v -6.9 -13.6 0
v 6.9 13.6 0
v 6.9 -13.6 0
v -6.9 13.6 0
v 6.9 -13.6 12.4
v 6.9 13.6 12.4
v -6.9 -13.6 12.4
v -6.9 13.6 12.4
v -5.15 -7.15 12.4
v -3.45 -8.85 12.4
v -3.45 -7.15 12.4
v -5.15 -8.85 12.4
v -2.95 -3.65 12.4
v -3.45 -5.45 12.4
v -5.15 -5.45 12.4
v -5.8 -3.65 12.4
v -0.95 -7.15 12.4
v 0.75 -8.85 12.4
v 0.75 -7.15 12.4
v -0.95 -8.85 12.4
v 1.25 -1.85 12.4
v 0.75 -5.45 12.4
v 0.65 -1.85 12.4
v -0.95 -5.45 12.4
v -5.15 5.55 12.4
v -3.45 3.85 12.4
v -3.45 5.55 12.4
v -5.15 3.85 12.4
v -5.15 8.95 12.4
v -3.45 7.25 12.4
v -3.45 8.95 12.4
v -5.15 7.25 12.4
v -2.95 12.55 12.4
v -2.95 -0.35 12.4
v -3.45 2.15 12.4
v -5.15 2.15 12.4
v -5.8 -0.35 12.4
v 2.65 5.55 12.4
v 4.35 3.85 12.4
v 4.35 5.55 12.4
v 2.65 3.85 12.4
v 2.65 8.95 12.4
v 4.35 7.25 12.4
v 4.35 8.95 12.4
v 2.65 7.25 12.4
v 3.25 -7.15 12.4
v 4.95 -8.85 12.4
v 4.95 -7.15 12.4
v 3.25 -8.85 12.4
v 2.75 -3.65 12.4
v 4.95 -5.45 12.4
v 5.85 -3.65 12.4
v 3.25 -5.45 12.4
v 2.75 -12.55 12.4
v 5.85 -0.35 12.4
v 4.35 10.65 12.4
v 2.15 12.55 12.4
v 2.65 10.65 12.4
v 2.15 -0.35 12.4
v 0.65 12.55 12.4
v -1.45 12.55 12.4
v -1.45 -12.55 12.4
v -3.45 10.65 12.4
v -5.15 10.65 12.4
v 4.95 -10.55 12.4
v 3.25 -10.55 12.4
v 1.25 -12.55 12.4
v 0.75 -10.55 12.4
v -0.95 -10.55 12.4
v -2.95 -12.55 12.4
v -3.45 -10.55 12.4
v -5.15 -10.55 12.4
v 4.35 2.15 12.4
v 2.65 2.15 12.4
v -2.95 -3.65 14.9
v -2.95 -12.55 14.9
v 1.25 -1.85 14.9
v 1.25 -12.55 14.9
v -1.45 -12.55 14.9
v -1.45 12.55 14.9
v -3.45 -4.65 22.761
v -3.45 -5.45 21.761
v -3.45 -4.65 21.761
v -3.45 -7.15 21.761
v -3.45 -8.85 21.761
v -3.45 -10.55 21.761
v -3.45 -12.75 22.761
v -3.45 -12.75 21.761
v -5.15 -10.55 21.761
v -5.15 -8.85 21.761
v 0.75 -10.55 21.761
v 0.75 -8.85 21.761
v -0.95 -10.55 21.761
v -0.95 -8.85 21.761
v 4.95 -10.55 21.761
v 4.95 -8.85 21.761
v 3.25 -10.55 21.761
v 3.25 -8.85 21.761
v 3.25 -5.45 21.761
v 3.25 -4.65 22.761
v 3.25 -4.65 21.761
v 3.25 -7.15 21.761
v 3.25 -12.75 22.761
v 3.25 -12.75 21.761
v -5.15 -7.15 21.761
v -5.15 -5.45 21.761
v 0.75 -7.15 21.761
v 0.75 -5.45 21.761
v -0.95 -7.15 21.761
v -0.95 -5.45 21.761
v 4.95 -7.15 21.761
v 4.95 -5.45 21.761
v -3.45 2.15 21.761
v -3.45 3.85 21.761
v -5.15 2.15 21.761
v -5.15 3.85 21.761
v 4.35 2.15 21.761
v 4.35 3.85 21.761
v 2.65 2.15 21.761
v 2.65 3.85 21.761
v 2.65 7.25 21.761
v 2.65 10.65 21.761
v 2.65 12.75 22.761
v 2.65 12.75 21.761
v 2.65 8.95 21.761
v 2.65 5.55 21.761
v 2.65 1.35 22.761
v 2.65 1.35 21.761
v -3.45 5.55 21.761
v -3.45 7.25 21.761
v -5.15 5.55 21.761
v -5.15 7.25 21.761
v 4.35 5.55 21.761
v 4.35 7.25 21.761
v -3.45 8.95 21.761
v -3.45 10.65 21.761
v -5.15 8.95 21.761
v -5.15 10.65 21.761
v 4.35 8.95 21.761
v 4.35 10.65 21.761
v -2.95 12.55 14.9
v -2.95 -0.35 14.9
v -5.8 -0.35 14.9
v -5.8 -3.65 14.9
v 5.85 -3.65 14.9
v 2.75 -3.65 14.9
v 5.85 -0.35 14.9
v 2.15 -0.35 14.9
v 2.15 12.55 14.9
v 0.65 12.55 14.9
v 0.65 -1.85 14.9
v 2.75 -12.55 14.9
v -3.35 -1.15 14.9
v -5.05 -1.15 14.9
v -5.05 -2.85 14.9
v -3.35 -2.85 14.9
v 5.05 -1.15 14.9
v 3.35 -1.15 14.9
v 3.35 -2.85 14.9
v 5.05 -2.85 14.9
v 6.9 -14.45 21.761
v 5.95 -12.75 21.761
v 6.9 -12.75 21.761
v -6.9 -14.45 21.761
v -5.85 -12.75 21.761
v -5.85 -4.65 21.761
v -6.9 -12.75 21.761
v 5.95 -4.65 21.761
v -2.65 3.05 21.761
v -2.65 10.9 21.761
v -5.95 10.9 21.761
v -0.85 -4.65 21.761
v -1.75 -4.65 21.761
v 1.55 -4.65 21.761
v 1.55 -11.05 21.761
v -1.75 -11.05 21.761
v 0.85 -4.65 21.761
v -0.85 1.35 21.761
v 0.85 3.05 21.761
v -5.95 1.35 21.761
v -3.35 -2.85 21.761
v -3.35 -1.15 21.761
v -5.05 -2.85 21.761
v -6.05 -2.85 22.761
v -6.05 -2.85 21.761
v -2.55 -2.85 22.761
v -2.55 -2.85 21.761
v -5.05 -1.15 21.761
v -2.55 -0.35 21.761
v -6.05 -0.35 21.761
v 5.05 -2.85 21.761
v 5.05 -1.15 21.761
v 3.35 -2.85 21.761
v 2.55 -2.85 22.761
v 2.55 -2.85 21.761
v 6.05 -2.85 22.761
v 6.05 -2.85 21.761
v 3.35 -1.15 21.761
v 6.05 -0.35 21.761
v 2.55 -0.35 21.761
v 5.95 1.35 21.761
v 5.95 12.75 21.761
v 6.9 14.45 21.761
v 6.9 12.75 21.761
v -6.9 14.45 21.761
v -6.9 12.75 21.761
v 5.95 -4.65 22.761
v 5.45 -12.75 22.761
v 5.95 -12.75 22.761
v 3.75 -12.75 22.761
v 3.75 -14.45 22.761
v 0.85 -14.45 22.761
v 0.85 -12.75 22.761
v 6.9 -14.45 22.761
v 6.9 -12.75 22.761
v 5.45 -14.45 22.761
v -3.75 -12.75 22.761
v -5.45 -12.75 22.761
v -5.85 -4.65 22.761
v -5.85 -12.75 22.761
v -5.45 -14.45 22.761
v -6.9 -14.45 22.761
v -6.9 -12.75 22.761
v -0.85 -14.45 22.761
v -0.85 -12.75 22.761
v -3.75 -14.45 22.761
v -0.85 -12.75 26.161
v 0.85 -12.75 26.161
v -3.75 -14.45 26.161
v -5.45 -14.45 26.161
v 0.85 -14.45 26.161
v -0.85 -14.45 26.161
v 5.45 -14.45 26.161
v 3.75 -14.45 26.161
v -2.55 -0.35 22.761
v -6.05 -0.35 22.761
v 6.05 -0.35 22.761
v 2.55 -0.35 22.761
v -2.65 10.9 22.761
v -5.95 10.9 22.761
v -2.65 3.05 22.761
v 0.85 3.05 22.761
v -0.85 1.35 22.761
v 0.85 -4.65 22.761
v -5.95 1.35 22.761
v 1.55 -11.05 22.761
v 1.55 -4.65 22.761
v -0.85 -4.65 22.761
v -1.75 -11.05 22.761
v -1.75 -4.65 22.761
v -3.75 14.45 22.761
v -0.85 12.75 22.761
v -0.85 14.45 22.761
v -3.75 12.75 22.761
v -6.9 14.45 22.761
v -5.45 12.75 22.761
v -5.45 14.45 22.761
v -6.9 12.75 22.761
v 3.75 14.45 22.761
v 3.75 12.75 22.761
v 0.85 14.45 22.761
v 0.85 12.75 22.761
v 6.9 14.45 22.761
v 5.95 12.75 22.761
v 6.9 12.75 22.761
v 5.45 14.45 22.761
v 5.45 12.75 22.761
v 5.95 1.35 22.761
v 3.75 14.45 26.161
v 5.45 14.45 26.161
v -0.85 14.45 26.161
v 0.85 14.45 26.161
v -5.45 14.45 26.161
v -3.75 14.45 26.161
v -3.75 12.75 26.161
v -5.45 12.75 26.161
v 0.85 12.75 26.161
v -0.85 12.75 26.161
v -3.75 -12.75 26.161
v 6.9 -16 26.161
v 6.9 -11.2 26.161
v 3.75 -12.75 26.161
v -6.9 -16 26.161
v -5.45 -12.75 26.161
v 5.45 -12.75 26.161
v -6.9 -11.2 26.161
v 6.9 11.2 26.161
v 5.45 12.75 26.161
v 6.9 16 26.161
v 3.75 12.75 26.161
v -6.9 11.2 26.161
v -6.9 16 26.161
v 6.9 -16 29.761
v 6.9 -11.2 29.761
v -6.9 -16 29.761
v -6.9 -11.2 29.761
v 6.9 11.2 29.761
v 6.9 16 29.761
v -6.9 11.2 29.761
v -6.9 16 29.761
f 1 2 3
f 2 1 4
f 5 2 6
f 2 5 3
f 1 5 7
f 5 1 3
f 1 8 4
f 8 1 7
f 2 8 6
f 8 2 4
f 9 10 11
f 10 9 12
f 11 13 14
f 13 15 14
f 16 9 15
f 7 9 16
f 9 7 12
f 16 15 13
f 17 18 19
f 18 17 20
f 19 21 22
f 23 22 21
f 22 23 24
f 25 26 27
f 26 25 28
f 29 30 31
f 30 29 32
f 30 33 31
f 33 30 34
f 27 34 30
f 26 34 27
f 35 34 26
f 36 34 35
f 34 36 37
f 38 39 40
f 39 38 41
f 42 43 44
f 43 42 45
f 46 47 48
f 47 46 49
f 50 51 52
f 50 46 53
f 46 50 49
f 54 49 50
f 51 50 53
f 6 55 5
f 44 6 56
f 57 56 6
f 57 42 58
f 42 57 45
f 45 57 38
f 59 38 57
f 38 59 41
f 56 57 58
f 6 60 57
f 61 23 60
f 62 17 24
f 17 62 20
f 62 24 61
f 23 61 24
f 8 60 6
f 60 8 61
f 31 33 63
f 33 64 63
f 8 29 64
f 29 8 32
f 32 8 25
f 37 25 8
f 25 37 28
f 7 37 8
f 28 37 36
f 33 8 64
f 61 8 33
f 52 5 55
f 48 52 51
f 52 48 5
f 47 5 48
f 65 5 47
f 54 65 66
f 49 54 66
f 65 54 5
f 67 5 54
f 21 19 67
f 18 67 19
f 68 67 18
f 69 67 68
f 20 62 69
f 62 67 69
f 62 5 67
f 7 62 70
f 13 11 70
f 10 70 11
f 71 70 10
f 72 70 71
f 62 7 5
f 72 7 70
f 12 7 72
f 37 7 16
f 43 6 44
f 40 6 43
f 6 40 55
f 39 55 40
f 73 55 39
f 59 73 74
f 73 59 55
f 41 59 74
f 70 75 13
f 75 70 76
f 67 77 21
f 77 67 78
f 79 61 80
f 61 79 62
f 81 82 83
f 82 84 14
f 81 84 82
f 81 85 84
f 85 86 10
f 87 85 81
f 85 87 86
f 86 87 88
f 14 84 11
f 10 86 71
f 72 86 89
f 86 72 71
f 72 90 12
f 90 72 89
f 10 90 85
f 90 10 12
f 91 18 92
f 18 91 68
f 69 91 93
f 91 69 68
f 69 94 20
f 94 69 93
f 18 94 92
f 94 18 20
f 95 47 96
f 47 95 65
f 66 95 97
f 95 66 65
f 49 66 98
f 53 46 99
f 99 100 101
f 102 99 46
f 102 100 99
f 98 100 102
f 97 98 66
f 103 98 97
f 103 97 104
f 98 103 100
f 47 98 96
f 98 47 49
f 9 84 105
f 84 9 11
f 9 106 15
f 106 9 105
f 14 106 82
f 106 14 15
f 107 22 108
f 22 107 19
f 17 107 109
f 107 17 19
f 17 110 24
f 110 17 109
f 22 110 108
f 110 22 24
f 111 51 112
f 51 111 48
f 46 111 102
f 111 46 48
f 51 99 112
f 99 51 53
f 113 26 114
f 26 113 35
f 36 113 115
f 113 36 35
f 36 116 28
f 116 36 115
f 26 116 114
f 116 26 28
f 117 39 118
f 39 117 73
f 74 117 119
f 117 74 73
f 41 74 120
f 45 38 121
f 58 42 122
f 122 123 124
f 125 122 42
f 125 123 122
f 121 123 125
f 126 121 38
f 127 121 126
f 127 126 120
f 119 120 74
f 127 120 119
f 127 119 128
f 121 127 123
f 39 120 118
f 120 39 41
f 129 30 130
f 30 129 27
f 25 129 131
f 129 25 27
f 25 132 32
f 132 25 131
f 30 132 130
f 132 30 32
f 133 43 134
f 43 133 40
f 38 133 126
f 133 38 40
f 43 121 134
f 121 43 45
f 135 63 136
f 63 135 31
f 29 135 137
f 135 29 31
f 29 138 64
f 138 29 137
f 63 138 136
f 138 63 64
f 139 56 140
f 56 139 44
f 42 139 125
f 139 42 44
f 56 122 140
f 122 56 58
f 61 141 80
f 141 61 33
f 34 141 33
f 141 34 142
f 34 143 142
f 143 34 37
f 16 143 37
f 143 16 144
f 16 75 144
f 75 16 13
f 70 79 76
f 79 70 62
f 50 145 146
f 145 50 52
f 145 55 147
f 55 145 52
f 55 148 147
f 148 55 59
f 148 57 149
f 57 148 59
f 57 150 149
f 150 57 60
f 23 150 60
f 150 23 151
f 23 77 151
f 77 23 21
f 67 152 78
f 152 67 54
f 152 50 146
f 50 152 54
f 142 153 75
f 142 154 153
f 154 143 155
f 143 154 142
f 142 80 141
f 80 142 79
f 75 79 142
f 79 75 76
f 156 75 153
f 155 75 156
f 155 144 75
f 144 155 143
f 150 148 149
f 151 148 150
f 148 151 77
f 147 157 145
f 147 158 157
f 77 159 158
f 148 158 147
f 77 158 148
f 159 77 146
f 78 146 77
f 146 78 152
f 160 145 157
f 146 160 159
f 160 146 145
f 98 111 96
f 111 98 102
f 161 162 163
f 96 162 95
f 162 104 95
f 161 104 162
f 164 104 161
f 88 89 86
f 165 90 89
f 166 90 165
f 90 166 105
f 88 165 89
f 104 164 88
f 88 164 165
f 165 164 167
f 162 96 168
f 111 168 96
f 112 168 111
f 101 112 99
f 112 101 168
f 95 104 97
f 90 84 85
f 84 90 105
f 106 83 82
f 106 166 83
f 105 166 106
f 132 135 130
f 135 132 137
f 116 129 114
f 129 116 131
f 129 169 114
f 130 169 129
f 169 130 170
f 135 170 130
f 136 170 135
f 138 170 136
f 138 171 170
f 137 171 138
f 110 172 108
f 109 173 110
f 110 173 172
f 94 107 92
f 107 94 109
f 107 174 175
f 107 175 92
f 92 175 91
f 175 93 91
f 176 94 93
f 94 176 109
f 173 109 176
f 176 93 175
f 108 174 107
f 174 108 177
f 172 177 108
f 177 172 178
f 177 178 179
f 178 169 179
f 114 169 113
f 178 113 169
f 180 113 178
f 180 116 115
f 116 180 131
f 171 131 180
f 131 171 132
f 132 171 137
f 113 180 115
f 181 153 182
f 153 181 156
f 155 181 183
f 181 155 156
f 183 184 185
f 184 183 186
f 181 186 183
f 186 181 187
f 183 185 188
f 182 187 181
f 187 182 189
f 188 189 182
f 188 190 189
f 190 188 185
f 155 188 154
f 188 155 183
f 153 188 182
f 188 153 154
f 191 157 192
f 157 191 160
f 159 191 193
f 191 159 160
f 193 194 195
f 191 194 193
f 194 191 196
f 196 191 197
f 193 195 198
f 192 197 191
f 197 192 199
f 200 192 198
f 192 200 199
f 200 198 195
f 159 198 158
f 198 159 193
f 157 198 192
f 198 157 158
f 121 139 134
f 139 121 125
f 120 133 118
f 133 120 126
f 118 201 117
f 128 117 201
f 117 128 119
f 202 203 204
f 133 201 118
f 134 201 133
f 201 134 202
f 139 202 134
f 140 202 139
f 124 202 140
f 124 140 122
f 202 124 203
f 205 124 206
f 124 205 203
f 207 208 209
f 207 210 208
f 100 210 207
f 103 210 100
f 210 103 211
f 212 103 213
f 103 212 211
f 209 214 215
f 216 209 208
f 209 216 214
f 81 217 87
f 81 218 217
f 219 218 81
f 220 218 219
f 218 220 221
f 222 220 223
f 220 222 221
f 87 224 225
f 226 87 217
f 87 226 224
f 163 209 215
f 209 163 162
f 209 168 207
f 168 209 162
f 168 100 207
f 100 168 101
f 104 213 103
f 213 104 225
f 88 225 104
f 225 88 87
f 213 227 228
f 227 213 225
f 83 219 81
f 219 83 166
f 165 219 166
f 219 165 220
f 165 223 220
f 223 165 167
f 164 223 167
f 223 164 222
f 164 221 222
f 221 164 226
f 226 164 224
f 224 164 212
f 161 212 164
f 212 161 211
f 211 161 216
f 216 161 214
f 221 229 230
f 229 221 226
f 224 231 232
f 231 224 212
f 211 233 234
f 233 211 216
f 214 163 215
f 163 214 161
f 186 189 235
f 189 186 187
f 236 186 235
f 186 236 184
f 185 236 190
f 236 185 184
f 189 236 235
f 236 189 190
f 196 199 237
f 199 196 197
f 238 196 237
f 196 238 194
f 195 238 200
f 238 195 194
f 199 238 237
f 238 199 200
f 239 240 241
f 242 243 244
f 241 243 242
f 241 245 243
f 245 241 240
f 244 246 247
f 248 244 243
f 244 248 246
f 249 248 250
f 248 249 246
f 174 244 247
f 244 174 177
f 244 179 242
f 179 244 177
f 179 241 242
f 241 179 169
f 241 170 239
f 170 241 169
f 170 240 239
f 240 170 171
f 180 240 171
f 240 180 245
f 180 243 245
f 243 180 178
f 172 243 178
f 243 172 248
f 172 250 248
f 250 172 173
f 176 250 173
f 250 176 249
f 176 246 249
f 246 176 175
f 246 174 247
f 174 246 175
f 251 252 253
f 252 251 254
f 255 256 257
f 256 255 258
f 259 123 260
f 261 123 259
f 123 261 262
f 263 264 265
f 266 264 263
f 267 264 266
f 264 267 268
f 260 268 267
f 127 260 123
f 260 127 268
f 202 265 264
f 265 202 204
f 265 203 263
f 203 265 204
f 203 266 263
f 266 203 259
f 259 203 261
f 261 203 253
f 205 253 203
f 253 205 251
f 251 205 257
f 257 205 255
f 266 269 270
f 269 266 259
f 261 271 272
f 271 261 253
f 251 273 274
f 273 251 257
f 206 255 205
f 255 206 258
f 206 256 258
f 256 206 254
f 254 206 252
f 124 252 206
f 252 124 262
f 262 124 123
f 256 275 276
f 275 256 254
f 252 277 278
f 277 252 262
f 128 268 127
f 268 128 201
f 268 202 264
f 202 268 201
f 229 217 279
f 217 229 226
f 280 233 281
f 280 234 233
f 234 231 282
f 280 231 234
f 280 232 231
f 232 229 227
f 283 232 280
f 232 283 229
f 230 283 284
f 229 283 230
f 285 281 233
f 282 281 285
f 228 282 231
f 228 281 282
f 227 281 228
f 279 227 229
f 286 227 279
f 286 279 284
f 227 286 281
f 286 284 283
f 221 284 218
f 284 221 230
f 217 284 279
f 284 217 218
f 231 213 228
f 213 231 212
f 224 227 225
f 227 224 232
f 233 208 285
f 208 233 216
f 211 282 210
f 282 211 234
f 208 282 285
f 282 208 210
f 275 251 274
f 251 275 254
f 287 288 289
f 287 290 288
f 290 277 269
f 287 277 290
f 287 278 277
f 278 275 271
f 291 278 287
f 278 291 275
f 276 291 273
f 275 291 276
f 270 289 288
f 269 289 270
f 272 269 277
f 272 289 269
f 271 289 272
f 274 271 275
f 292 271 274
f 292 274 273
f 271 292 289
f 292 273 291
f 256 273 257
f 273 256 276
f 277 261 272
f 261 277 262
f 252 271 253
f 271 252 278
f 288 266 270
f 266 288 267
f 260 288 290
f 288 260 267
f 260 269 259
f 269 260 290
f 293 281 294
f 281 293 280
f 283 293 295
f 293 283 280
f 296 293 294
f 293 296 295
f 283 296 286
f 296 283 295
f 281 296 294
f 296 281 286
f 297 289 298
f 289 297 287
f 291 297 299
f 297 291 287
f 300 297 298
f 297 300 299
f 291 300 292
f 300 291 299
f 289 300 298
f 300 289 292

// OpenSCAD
// Generated by SolidPython 0.4.2 on 2020-09-29 23:21:31
//!OpenSCAD

scale(v = 0.0100000000) {
	translate(v = [-690, -1360, 0]) {
		union() {
			color(c = [0.4000000000, 0.4000000000, 0.4000000000]) {
				translate(v = [0, 0, 0]) {
					linear_extrude(height = 1000.0000000000) {
						polygon(paths = [[0, 1, 2, 3]], points = [[0, 0], [0, 2720], [1380, 2720], [1380, 0]]);
					}
				}
			}
			color(c = [0.2000000000, 0.6000000000, 0.2000000000]) {
				translate(v = [0, 0, 1000.0000000000]) {
					linear_extrude(height = 120.0000000000) {
						polygon(paths = [[0, 1, 2, 3]], points = [[0, 1305], [0, 2720], [1380, 2720], [1380, 1305]]);
					}
				}
			}
			color(c = [0.4000000000, 0.4000000000, 0.4000000000]) {
				translate(v = [0, 0, 1000.0000000000]) {
					linear_extrude(height = 120.0000000000) {
						polygon(paths = [[0, 1, 2, 3]], points = [[0, 0], [0, 1305], [1380, 1305], [1380, 0]]);
					}
				}
			}
			color(c = [0.9000000000, 0.6000000000, 0.6000000000]) {
				translate(v = [0, 0, 1120.0000000000]) {
					linear_extrude(height = 120.0000000000) {
						polygon(paths = [[0, 1, 2, 3]], points = [[135, 1485], [135, 2485], [395, 2485], [395, 1485]]);
					}
				}
			}
			color(c = [0.9000000000, 0.6000000000, 0.6000000000]) {
				translate(v = [0, 0, 1120.0000000000]) {
					linear_extrude(height = 120.0000000000) {
						polygon(paths = [[0, 1, 2, 3]], points = [[545, 1485], [545, 2485], [755, 2485], [755, 1485]]);
					}
				}
			}
			color(c = [0.9000000000, 0.6000000000, 0.6000000000]) {
				translate(v = [0, 0, 1120.0000000000]) {
					linear_extrude(height = 120.0000000000) {
						polygon(paths = [[0, 1, 2, 3]], points = [[905, 1485], [905, 2485], [1165, 2485], [1165, 1485]]);
					}
				}
			}
			color(c = [0.9000000000, 0.6000000000, 0.9000000000]) {
				translate(v = [0, 0, 1120.0000000000]) {
					linear_extrude(height = 120.0000000000) {
						polygon(paths = [[0, 1, 2, 3]], points = [[135, 235], [135, 885], [395, 885], [395, 235]]);
					}
				}
			}
			color(c = [0.9000000000, 0.6000000000, 0.9000000000]) {
				translate(v = [0, 0, 1120.0000000000]) {
					linear_extrude(height = 120.0000000000) {
						polygon(paths = [[0, 1, 2, 3]], points = [[545, 235], [545, 885], [815, 885], [815, 235]]);
					}
				}
			}
			color(c = [0.9000000000, 0.6000000000, 0.9000000000]) {
				translate(v = [0, 0, 1120.0000000000]) {
					linear_extrude(height = 120.0000000000) {
						polygon(paths = [[0, 1, 2, 3]], points = [[965, 235], [965, 885], [1225, 885], [1225, 235]]);
					}
				}
			}
			color(c = [0.2000000000, 0.6000000000, 0.2000000000]) {
				translate(v = [0, 0, 1120.0000000000]) {
					linear_extrude(height = 120.0000000000) {
						difference() {
							polygon(paths = [[0, 1, 2, 3]], points = [[0, 1305], [0, 2720], [1380, 2720], [1380, 1305]]);
							polygon(paths = [[0, 1, 2, 3]], points = [[135, 1485], [395, 1485], [395, 2485], [135, 2485]]);
							polygon(paths = [[0, 1, 2, 3]], points = [[545, 1485], [755, 1485], [755, 2485], [545, 2485]]);
							polygon(paths = [[0, 1, 2, 3]], points = [[905, 1485], [1165, 1485], [1165, 2485], [905, 2485]]);
						}
					}
				}
			}
			color(c = [0.4000000000, 0.4000000000, 0.4000000000]) {
				translate(v = [0, 0, 1120.0000000000]) {
					linear_extrude(height = 120.0000000000) {
						difference() {
							polygon(paths = [[0, 1, 2, 3]], points = [[0, 0], [0, 1305], [1380, 1305], [1380, 0]]);
							polygon(paths = [[0, 1, 2, 3]], points = [[135, 235], [395, 235], [395, 885], [135, 885]]);
							polygon(paths = [[0, 1, 2, 3]], points = [[545, 235], [815, 235], [815, 885], [545, 885]]);
							polygon(paths = [[0, 1, 2, 3]], points = [[965, 235], [1225, 235], [1225, 885], [965, 885]]);
						}
					}
				}
			}
			color(c = [0.1000000000, 0.1000000000, 0.1000000000]) {
				translate(v = [0, 0, 1240.0000000000]) {
					linear_extrude(height = 70.0000000000) {
						polygon(paths = [[0, 1, 2, 3]], points = [[175, 305], [175, 475], [345, 475], [345, 305]]);
					}
				}
			}
			color(c = [0.1000000000, 0.1000000000, 0.1000000000]) {
				translate(v = [0, 0, 1240.0000000000]) {
					linear_extrude(height = 70.0000000000) {
						polygon(paths = [[0, 1, 2, 3]], points = [[595, 305], [595, 475], [765, 475], [765, 305]]);
					}
				}
			}
			color(c = [0.1000000000, 0.1000000000, 0.1000000000]) {
				translate(v = [0, 0, 1240.0000000000]) {
					linear_extrude(height = 70.0000000000) {
						polygon(paths = [[0, 1, 2, 3]], points = [[1015, 305], [1015, 475], [1185, 475], [1185, 305]]);
					}
				}
			}
			color(c = [0.1000000000, 0.1000000000, 0.1000000000]) {
				translate(v = [0, 0, 1240.0000000000]) {
					linear_extrude(height = 70.0000000000) {
						polygon(paths = [[0, 1, 2, 3]], points = [[175, 645], [175, 815], [345, 815], [345, 645]]);
					}
				}
			}
			color(c = [0.1000000000, 0.1000000000, 0.1000000000]) {
				translate(v = [0, 0, 1240.0000000000]) {
					linear_extrude(height = 70.0000000000) {
						polygon(paths = [[0, 1, 2, 3]], points = [[595, 645], [595, 815], [765, 815], [765, 645]]);
					}
				}
			}
			color(c = [0.1000000000, 0.1000000000, 0.1000000000]) {
				translate(v = [0, 0, 1240.0000000000]) {
					linear_extrude(height = 70.0000000000) {
						polygon(paths = [[0, 1, 2, 3]], points = [[1015, 645], [1015, 815], [1185, 815], [1185, 645]]);
					}
				}
			}
			color(c = [0.1000000000, 0.1000000000, 0.1000000000]) {
				translate(v = [0, 0, 1240.0000000000]) {
					linear_extrude(height = 70.0000000000) {
						polygon(paths = [[0, 1, 2, 3]], points = [[175, 1575], [175, 1745], [345, 1745], [345, 1575]]);
					}
				}
			}
			color(c = [0.1000000000, 0.1000000000, 0.1000000000]) {
				translate(v = [0, 0, 1240.0000000000]) {
					linear_extrude(height = 70.0000000000) {
						polygon(paths = [[0, 1, 2, 3]], points = [[955, 1575], [955, 1745], [1125, 1745], [1125, 1575]]);
					}
				}
			}
			color(c = [0.1000000000, 0.1000000000, 0.1000000000]) {
				translate(v = [0, 0, 1240.0000000000]) {
					linear_extrude(height = 70.0000000000) {
						polygon(paths = [[0, 1, 2, 3]], points = [[175, 1915], [175, 2085], [345, 2085], [345, 1915]]);
					}
				}
			}
			color(c = [0.1000000000, 0.1000000000, 0.1000000000]) {
				translate(v = [0, 0, 1240.0000000000]) {
					linear_extrude(height = 70.0000000000) {
						polygon(paths = [[0, 1, 2, 3]], points = [[955, 1915], [955, 2085], [1125, 2085], [1125, 1915]]);
					}
				}
			}
			color(c = [0.1000000000, 0.1000000000, 0.1000000000]) {
				translate(v = [0, 0, 1240.0000000000]) {
					linear_extrude(height = 70.0000000000) {
						polygon(paths = [[0, 1, 2, 3]], points = [[175, 2255], [175, 2425], [345, 2425], [345, 2255]]);
					}
				}
			}
			color(c = [0.1000000000, 0.1000000000, 0.1000000000]) {
				translate(v = [0, 0, 1240.0000000000]) {
					linear_extrude(height = 70.0000000000) {
						polygon(paths = [[0, 1, 2, 3]], points = [[955, 2255], [955, 2425], [1125, 2425], [1125, 2255]]);
					}
				}
			}
			color(c = [1.0000000000, 1.0000000000, 1.0000000000]) {
				translate(v = [0, 0, 1240.0000000000]) {
					linear_extrude(height = 70.0000000000) {
						polygon(paths = [[0, 1, 2, 3, 4, 5, 6, 7]], points = [[395, 105], [395, 995], [110, 995], [110, 1325], [395, 1325], [395, 2615], [545, 2615], [545, 105]]);
					}
				}
			}
			color(c = [1.0000000000, 1.0000000000, 1.0000000000]) {
				translate(v = [0, 0, 1240.0000000000]) {
					linear_extrude(height = 70.0000000000) {
						polygon(paths = [[0, 1, 2, 3, 4, 5, 6, 7, 8, 9]], points = [[815, 105], [815, 1175], [755, 1175], [755, 2615], [905, 2615], [905, 1325], [1275, 1325], [1275, 995], [965, 995], [965, 105]]);
					}
				}
			}
			color(c = [0.1000000000, 0.1000000000, 0.1000000000]) {
				translate(v = [0, 0, 1310.0000000000]) {
					linear_extrude(height = 180.0000000000) {
						polygon(paths = [[0, 1, 2, 3]], points = [[175, 305], [175, 475], [345, 475], [345, 305]]);
					}
				}
			}
			color(c = [0.1000000000, 0.1000000000, 0.1000000000]) {
				translate(v = [0, 0, 1310.0000000000]) {
					linear_extrude(height = 180.0000000000) {
						polygon(paths = [[0, 1, 2, 3]], points = [[595, 305], [595, 475], [765, 475], [765, 305]]);
					}
				}
			}
			color(c = [0.1000000000, 0.1000000000, 0.1000000000]) {
				translate(v = [0, 0, 1310.0000000000]) {
					linear_extrude(height = 180.0000000000) {
						polygon(paths = [[0, 1, 2, 3]], points = [[1015, 305], [1015, 475], [1185, 475], [1185, 305]]);
					}
				}
			}
			color(c = [0.1000000000, 0.1000000000, 0.1000000000]) {
				translate(v = [0, 0, 1310.0000000000]) {
					linear_extrude(height = 180.0000000000) {
						polygon(paths = [[0, 1, 2, 3]], points = [[175, 645], [175, 815], [345, 815], [345, 645]]);
					}
				}
			}
			color(c = [0.1000000000, 0.1000000000, 0.1000000000]) {
				translate(v = [0, 0, 1310.0000000000]) {
					linear_extrude(height = 180.0000000000) {
						polygon(paths = [[0, 1, 2, 3]], points = [[595, 645], [595, 815], [765, 815], [765, 645]]);
					}
				}
			}
			color(c = [0.1000000000, 0.1000000000, 0.1000000000]) {
				translate(v = [0, 0, 1310.0000000000]) {
					linear_extrude(height = 180.0000000000) {
						polygon(paths = [[0, 1, 2, 3]], points = [[1015, 645], [1015, 815], [1185, 815], [1185, 645]]);
					}
				}
			}
			color(c = [0.1000000000, 0.1000000000, 0.1000000000]) {
				translate(v = [0, 0, 1310.0000000000]) {
					linear_extrude(height = 180.0000000000) {
						polygon(paths = [[0, 1, 2, 3]], points = [[175, 1575], [175, 1745], [345, 1745], [345, 1575]]);
					}
				}
			}
			color(c = [0.1000000000, 0.1000000000, 0.1000000000]) {
				translate(v = [0, 0, 1310.0000000000]) {
					linear_extrude(height = 180.0000000000) {
						polygon(paths = [[0, 1, 2, 3]], points = [[955, 1575], [955, 1745], [1125, 1745], [1125, 1575]]);
					}
				}
			}
			color(c = [0.1000000000, 0.1000000000, 0.1000000000]) {
				translate(v = [0, 0, 1310.0000000000]) {
					linear_extrude(height = 180.0000000000) {
						polygon(paths = [[0, 1, 2, 3]], points = [[175, 1915], [175, 2085], [345, 2085], [345, 1915]]);
					}
				}
			}
			color(c = [0.1000000000, 0.1000000000, 0.1000000000]) {
				translate(v = [0, 0, 1310.0000000000]) {
					linear_extrude(height = 180.0000000000) {
						polygon(paths = [[0, 1, 2, 3]], points = [[955, 1915], [955, 2085], [1125, 2085], [1125, 1915]]);
					}
				}
			}
			color(c = [0.1000000000, 0.1000000000, 0.1000000000]) {
				translate(v = [0, 0, 1310.0000000000]) {
					linear_extrude(height = 180.0000000000) {
						polygon(paths = [[0, 1, 2, 3]], points = [[175, 2255], [175, 2425], [345, 2425], [345, 2255]]);
					}
				}
			}
			color(c = [0.1000000000, 0.1000000000, 0.1000000000]) {
				translate(v = [0, 0, 1310.0000000000]) {
					linear_extrude(height = 180.0000000000) {
						polygon(paths = [[0, 1, 2, 3]], points = [[955, 2255], [955, 2425], [1125, 2425], [1125, 2255]]);
					}
				}
			}
			color(c = [0.7000000000, 0, 0]) {
				translate(v = [0, 0, 1310.0000000000]) {
					linear_extrude(height = 180.0000000000) {
						polygon(paths = [[0, 1, 2, 3, 4, 5, 6, 7]], points = [[395, 105], [395, 995], [110, 995], [110, 1325], [395, 1325], [395, 2615], [545, 2615], [545, 105]]);
					}
				}
			}
			color(c = [0.7000000000, 0, 0]) {
				translate(v = [0, 0, 1310.0000000000]) {
					linear_extrude(height = 180.0000000000) {
						polygon(paths = [[0, 1, 2, 3, 4, 5, 6, 7, 8, 9]], points = [[815, 105], [815, 1175], [755, 1175], [755, 2615], [905, 2615], [905, 1325], [1275, 1325], [1275, 995], [965, 995], [965, 105]]);
					}
				}
			}
			color(c = [0.1000000000, 0.1000000000, 0.1000000000]) {
				translate(v = [0, 0, 1490.0000000000]) {
					linear_extrude(height = 686.1000000000) {
						polygon(paths = [[0, 1, 2, 3]], points = [[175, 305], [175, 475], [345, 475], [345, 305]]);
					}
				}
			}
			color(c = [0.1000000000, 0.1000000000, 0.1000000000]) {
				translate(v = [0, 0, 1490.0000000000]) {
					linear_extrude(height = 686.1000000000) {
						polygon(paths = [[0, 1, 2, 3]], points = [[595, 305], [595, 475], [765, 475], [765, 305]]);
					}
				}
			}
			color(c = [0.1000000000, 0.1000000000, 0.1000000000]) {
				translate(v = [0, 0, 1490.0000000000]) {
					linear_extrude(height = 686.1000000000) {
						polygon(paths = [[0, 1, 2, 3]], points = [[1015, 305], [1015, 475], [1185, 475], [1185, 305]]);
					}
				}
			}
			color(c = [0.1000000000, 0.1000000000, 0.1000000000]) {
				translate(v = [0, 0, 1490.0000000000]) {
					linear_extrude(height = 686.1000000000) {
						polygon(paths = [[0, 1, 2, 3]], points = [[175, 645], [175, 815], [345, 815], [345, 645]]);
					}
				}
			}
			color(c = [0.1000000000, 0.1000000000, 0.1000000000]) {
				translate(v = [0, 0, 1490.0000000000]) {
					linear_extrude(height = 686.1000000000) {
						polygon(paths = [[0, 1, 2, 3]], points = [[595, 645], [595, 815], [765, 815], [765, 645]]);
					}
				}
			}
			color(c = [0.1000000000, 0.1000000000, 0.1000000000]) {
				translate(v = [0, 0, 1490.0000000000]) {
					linear_extrude(height = 686.1000000000) {
						polygon(paths = [[0, 1, 2, 3]], points = [[1015, 645], [1015, 815], [1185, 815], [1185, 645]]);
					}
				}
			}
			color(c = [0.1000000000, 0.1000000000, 0.1000000000]) {
				translate(v = [0, 0, 1490.0000000000]) {
					linear_extrude(height = 686.1000000000) {
						polygon(paths = [[0, 1, 2, 3]], points = [[185, 1075], [185, 1245], [355, 1245], [355, 1075]]);
					}
				}
			}
			color(c = [0.1000000000, 0.1000000000, 0.1000000000]) {
				translate(v = [0, 0, 1490.0000000000]) {
					linear_extrude(height = 686.1000000000) {
						polygon(paths = [[0, 1, 2, 3]], points = [[1025, 1075], [1025, 1245], [1195, 1245], [1195, 1075]]);
					}
				}
			}
			color(c = [0.1000000000, 0.1000000000, 0.1000000000]) {
				translate(v = [0, 0, 1490.0000000000]) {
					linear_extrude(height = 686.1000000000) {
						polygon(paths = [[0, 1, 2, 3]], points = [[175, 1575], [175, 1745], [345, 1745], [345, 1575]]);
					}
				}
			}
			color(c = [0.1000000000, 0.1000000000, 0.1000000000]) {
				translate(v = [0, 0, 1490.0000000000]) {
					linear_extrude(height = 686.1000000000) {
						polygon(paths = [[0, 1, 2, 3]], points = [[955, 1575], [955, 1745], [1125, 1745], [1125, 1575]]);
					}
				}
			}
			color(c = [0.1000000000, 0.1000000000, 0.1000000000]) {
				translate(v = [0, 0, 1490.0000000000]) {
					linear_extrude(height = 686.1000000000) {
						polygon(paths = [[0, 1, 2, 3]], points = [[175, 1915], [175, 2085], [345, 2085], [345, 1915]]);
					}
				}
			}
			color(c = [0.1000000000, 0.1000000000, 0.1000000000]) {
				translate(v = [0, 0, 1490.0000000000]) {
					linear_extrude(height = 686.1000000000) {
						polygon(paths = [[0, 1, 2, 3]], points = [[955, 1915], [955, 2085], [1125, 2085], [1125, 1915]]);
					}
				}
			}
			color(c = [0.1000000000, 0.1000000000, 0.1000000000]) {
				translate(v = [0, 0, 1490.0000000000]) {
					linear_extrude(height = 686.1000000000) {
						polygon(paths = [[0, 1, 2, 3]], points = [[175, 2255], [175, 2425], [345, 2425], [345, 2255]]);
					}
				}
			}
			color(c = [0.1000000000, 0.1000000000, 0.1000000000]) {
				translate(v = [0, 0, 1490.0000000000]) {
					linear_extrude(height = 686.1000000000) {
						polygon(paths = [[0, 1, 2, 3]], points = [[955, 2255], [955, 2425], [1125, 2425], [1125, 2255]]);
					}
				}
			}
			color(c = [0.9000000000, 0.6000000000, 0.6000000000]) {
				translate(v = [0, 0, 2176.1000000000]) {
					linear_extrude(height = 100.0000000000) {
						polygon(paths = [[0, 1, 2, 3, 4, 5, 6, 7, 8, 9, 10, 11]], points = [[0, -85], [0, 85], [105, 85], [105, 895], [345, 895], [345, 85], [1015, 85], [1015, 895], [1285, 895], [1285, 85], [1380, 85], [1380, -85]]);
					}
				}
			}
			color(c = [0.9000000000, 0.6000000000, 0.6000000000]) {
				translate(v = [0, 0, 2176.1000000000]) {
					linear_extrude(height = 100.0000000000) {
						polygon(paths = [[0, 1, 2, 3]], points = [[85, 1075], [85, 1325], [435, 1325], [435, 1075]]);
					}
				}
			}
			color(c = [0.9000000000, 0.6000000000, 0.6000000000]) {
				translate(v = [0, 0, 2176.1000000000]) {
					linear_extrude(height = 100.0000000000) {
						polygon(paths = [[0, 1, 2, 3]], points = [[945, 1075], [945, 1325], [1295, 1325], [1295, 1075]]);
					}
				}
			}
			color(c = [0.9000000000, 0.6000000000, 0.6000000000]) {
				translate(v = [0, 0, 2176.1000000000]) {
					linear_extrude(height = 100.0000000000) {
						polygon(paths = [[0, 1, 2, 3, 4, 5, 6, 7, 8, 9, 10, 11]], points = [[515, 255], [515, 895], [605, 895], [605, 1495], [95, 1495], [95, 2450], [425, 2450], [425, 1665], [775, 1665], [775, 895], [845, 895], [845, 255]]);
					}
				}
			}
			color(c = [0.9000000000, 0.6000000000, 0.6000000000]) {
				translate(v = [0, 0, 2176.1000000000]) {
					linear_extrude(height = 100.0000000000) {
						polygon(paths = [[0, 1, 2, 3, 4, 5, 6, 7]], points = [[955, 1495], [955, 2635], [0, 2635], [0, 2805], [1380, 2805], [1380, 2635], [1285, 2635], [1285, 1495]]);
					}
				}
			}
			color(c = [0.5000000000, 0.5000000000, 0.5000000000]) {
				translate(v = [0, 0, 2276.1000000000]) {
					linear_extrude(height = 340.0000000000) {
						polygon(paths = [[0, 1, 2, 3]], points = [[145, -85], [145, 85], [315, 85], [315, -85]]);
					}
				}
			}
			color(c = [0.5000000000, 0.5000000000, 0.5000000000]) {
				translate(v = [0, 0, 2276.1000000000]) {
					linear_extrude(height = 340.0000000000) {
						polygon(paths = [[0, 1, 2, 3]], points = [[605, -85], [605, 85], [775, 85], [775, -85]]);
					}
				}
			}
			color(c = [0.5000000000, 0.5000000000, 0.5000000000]) {
				translate(v = [0, 0, 2276.1000000000]) {
					linear_extrude(height = 340.0000000000) {
						polygon(paths = [[0, 1, 2, 3]], points = [[1065, -85], [1065, 85], [1235, 85], [1235, -85]]);
					}
				}
			}
			color(c = [0.5000000000, 0.5000000000, 0.5000000000]) {
				translate(v = [0, 0, 2276.1000000000]) {
					linear_extrude(height = 340.0000000000) {
						polygon(paths = [[0, 1, 2, 3]], points = [[145, 2635], [145, 2805], [315, 2805], [315, 2635]]);
					}
				}
			}
			color(c = [0.5000000000, 0.5000000000, 0.5000000000]) {
				translate(v = [0, 0, 2276.1000000000]) {
					linear_extrude(height = 340.0000000000) {
						polygon(paths = [[0, 1, 2, 3]], points = [[605, 2635], [605, 2805], [775, 2805], [775, 2635]]);
					}
				}
			}
			color(c = [0.5000000000, 0.5000000000, 0.5000000000]) {
				translate(v = [0, 0, 2276.1000000000]) {
					linear_extrude(height = 340.0000000000) {
						polygon(paths = [[0, 1, 2, 3]], points = [[1065, 2635], [1065, 2805], [1235, 2805], [1235, 2635]]);
					}
				}
			}
			color(c = [0.3000000000, 0.3000000000, 1]) {
				translate(v = [0, 0, 2616.1000000000]) {
					linear_extrude(height = 360.0000000000) {
						polygon(paths = [[0, 1, 2, 3]], points = [[0, -240], [0, 240], [1380, 240], [1380, -240]]);
					}
				}
			}
			color(c = [0.3000000000, 0.3000000000, 1]) {
				translate(v = [0, 0, 2616.1000000000]) {
					linear_extrude(height = 360.0000000000) {
						polygon(paths = [[0, 1, 2, 3]], points = [[0, 2480], [0, 2960], [1380, 2960], [1380, 2480]]);
					}
				}
			}
		}
	}
}
